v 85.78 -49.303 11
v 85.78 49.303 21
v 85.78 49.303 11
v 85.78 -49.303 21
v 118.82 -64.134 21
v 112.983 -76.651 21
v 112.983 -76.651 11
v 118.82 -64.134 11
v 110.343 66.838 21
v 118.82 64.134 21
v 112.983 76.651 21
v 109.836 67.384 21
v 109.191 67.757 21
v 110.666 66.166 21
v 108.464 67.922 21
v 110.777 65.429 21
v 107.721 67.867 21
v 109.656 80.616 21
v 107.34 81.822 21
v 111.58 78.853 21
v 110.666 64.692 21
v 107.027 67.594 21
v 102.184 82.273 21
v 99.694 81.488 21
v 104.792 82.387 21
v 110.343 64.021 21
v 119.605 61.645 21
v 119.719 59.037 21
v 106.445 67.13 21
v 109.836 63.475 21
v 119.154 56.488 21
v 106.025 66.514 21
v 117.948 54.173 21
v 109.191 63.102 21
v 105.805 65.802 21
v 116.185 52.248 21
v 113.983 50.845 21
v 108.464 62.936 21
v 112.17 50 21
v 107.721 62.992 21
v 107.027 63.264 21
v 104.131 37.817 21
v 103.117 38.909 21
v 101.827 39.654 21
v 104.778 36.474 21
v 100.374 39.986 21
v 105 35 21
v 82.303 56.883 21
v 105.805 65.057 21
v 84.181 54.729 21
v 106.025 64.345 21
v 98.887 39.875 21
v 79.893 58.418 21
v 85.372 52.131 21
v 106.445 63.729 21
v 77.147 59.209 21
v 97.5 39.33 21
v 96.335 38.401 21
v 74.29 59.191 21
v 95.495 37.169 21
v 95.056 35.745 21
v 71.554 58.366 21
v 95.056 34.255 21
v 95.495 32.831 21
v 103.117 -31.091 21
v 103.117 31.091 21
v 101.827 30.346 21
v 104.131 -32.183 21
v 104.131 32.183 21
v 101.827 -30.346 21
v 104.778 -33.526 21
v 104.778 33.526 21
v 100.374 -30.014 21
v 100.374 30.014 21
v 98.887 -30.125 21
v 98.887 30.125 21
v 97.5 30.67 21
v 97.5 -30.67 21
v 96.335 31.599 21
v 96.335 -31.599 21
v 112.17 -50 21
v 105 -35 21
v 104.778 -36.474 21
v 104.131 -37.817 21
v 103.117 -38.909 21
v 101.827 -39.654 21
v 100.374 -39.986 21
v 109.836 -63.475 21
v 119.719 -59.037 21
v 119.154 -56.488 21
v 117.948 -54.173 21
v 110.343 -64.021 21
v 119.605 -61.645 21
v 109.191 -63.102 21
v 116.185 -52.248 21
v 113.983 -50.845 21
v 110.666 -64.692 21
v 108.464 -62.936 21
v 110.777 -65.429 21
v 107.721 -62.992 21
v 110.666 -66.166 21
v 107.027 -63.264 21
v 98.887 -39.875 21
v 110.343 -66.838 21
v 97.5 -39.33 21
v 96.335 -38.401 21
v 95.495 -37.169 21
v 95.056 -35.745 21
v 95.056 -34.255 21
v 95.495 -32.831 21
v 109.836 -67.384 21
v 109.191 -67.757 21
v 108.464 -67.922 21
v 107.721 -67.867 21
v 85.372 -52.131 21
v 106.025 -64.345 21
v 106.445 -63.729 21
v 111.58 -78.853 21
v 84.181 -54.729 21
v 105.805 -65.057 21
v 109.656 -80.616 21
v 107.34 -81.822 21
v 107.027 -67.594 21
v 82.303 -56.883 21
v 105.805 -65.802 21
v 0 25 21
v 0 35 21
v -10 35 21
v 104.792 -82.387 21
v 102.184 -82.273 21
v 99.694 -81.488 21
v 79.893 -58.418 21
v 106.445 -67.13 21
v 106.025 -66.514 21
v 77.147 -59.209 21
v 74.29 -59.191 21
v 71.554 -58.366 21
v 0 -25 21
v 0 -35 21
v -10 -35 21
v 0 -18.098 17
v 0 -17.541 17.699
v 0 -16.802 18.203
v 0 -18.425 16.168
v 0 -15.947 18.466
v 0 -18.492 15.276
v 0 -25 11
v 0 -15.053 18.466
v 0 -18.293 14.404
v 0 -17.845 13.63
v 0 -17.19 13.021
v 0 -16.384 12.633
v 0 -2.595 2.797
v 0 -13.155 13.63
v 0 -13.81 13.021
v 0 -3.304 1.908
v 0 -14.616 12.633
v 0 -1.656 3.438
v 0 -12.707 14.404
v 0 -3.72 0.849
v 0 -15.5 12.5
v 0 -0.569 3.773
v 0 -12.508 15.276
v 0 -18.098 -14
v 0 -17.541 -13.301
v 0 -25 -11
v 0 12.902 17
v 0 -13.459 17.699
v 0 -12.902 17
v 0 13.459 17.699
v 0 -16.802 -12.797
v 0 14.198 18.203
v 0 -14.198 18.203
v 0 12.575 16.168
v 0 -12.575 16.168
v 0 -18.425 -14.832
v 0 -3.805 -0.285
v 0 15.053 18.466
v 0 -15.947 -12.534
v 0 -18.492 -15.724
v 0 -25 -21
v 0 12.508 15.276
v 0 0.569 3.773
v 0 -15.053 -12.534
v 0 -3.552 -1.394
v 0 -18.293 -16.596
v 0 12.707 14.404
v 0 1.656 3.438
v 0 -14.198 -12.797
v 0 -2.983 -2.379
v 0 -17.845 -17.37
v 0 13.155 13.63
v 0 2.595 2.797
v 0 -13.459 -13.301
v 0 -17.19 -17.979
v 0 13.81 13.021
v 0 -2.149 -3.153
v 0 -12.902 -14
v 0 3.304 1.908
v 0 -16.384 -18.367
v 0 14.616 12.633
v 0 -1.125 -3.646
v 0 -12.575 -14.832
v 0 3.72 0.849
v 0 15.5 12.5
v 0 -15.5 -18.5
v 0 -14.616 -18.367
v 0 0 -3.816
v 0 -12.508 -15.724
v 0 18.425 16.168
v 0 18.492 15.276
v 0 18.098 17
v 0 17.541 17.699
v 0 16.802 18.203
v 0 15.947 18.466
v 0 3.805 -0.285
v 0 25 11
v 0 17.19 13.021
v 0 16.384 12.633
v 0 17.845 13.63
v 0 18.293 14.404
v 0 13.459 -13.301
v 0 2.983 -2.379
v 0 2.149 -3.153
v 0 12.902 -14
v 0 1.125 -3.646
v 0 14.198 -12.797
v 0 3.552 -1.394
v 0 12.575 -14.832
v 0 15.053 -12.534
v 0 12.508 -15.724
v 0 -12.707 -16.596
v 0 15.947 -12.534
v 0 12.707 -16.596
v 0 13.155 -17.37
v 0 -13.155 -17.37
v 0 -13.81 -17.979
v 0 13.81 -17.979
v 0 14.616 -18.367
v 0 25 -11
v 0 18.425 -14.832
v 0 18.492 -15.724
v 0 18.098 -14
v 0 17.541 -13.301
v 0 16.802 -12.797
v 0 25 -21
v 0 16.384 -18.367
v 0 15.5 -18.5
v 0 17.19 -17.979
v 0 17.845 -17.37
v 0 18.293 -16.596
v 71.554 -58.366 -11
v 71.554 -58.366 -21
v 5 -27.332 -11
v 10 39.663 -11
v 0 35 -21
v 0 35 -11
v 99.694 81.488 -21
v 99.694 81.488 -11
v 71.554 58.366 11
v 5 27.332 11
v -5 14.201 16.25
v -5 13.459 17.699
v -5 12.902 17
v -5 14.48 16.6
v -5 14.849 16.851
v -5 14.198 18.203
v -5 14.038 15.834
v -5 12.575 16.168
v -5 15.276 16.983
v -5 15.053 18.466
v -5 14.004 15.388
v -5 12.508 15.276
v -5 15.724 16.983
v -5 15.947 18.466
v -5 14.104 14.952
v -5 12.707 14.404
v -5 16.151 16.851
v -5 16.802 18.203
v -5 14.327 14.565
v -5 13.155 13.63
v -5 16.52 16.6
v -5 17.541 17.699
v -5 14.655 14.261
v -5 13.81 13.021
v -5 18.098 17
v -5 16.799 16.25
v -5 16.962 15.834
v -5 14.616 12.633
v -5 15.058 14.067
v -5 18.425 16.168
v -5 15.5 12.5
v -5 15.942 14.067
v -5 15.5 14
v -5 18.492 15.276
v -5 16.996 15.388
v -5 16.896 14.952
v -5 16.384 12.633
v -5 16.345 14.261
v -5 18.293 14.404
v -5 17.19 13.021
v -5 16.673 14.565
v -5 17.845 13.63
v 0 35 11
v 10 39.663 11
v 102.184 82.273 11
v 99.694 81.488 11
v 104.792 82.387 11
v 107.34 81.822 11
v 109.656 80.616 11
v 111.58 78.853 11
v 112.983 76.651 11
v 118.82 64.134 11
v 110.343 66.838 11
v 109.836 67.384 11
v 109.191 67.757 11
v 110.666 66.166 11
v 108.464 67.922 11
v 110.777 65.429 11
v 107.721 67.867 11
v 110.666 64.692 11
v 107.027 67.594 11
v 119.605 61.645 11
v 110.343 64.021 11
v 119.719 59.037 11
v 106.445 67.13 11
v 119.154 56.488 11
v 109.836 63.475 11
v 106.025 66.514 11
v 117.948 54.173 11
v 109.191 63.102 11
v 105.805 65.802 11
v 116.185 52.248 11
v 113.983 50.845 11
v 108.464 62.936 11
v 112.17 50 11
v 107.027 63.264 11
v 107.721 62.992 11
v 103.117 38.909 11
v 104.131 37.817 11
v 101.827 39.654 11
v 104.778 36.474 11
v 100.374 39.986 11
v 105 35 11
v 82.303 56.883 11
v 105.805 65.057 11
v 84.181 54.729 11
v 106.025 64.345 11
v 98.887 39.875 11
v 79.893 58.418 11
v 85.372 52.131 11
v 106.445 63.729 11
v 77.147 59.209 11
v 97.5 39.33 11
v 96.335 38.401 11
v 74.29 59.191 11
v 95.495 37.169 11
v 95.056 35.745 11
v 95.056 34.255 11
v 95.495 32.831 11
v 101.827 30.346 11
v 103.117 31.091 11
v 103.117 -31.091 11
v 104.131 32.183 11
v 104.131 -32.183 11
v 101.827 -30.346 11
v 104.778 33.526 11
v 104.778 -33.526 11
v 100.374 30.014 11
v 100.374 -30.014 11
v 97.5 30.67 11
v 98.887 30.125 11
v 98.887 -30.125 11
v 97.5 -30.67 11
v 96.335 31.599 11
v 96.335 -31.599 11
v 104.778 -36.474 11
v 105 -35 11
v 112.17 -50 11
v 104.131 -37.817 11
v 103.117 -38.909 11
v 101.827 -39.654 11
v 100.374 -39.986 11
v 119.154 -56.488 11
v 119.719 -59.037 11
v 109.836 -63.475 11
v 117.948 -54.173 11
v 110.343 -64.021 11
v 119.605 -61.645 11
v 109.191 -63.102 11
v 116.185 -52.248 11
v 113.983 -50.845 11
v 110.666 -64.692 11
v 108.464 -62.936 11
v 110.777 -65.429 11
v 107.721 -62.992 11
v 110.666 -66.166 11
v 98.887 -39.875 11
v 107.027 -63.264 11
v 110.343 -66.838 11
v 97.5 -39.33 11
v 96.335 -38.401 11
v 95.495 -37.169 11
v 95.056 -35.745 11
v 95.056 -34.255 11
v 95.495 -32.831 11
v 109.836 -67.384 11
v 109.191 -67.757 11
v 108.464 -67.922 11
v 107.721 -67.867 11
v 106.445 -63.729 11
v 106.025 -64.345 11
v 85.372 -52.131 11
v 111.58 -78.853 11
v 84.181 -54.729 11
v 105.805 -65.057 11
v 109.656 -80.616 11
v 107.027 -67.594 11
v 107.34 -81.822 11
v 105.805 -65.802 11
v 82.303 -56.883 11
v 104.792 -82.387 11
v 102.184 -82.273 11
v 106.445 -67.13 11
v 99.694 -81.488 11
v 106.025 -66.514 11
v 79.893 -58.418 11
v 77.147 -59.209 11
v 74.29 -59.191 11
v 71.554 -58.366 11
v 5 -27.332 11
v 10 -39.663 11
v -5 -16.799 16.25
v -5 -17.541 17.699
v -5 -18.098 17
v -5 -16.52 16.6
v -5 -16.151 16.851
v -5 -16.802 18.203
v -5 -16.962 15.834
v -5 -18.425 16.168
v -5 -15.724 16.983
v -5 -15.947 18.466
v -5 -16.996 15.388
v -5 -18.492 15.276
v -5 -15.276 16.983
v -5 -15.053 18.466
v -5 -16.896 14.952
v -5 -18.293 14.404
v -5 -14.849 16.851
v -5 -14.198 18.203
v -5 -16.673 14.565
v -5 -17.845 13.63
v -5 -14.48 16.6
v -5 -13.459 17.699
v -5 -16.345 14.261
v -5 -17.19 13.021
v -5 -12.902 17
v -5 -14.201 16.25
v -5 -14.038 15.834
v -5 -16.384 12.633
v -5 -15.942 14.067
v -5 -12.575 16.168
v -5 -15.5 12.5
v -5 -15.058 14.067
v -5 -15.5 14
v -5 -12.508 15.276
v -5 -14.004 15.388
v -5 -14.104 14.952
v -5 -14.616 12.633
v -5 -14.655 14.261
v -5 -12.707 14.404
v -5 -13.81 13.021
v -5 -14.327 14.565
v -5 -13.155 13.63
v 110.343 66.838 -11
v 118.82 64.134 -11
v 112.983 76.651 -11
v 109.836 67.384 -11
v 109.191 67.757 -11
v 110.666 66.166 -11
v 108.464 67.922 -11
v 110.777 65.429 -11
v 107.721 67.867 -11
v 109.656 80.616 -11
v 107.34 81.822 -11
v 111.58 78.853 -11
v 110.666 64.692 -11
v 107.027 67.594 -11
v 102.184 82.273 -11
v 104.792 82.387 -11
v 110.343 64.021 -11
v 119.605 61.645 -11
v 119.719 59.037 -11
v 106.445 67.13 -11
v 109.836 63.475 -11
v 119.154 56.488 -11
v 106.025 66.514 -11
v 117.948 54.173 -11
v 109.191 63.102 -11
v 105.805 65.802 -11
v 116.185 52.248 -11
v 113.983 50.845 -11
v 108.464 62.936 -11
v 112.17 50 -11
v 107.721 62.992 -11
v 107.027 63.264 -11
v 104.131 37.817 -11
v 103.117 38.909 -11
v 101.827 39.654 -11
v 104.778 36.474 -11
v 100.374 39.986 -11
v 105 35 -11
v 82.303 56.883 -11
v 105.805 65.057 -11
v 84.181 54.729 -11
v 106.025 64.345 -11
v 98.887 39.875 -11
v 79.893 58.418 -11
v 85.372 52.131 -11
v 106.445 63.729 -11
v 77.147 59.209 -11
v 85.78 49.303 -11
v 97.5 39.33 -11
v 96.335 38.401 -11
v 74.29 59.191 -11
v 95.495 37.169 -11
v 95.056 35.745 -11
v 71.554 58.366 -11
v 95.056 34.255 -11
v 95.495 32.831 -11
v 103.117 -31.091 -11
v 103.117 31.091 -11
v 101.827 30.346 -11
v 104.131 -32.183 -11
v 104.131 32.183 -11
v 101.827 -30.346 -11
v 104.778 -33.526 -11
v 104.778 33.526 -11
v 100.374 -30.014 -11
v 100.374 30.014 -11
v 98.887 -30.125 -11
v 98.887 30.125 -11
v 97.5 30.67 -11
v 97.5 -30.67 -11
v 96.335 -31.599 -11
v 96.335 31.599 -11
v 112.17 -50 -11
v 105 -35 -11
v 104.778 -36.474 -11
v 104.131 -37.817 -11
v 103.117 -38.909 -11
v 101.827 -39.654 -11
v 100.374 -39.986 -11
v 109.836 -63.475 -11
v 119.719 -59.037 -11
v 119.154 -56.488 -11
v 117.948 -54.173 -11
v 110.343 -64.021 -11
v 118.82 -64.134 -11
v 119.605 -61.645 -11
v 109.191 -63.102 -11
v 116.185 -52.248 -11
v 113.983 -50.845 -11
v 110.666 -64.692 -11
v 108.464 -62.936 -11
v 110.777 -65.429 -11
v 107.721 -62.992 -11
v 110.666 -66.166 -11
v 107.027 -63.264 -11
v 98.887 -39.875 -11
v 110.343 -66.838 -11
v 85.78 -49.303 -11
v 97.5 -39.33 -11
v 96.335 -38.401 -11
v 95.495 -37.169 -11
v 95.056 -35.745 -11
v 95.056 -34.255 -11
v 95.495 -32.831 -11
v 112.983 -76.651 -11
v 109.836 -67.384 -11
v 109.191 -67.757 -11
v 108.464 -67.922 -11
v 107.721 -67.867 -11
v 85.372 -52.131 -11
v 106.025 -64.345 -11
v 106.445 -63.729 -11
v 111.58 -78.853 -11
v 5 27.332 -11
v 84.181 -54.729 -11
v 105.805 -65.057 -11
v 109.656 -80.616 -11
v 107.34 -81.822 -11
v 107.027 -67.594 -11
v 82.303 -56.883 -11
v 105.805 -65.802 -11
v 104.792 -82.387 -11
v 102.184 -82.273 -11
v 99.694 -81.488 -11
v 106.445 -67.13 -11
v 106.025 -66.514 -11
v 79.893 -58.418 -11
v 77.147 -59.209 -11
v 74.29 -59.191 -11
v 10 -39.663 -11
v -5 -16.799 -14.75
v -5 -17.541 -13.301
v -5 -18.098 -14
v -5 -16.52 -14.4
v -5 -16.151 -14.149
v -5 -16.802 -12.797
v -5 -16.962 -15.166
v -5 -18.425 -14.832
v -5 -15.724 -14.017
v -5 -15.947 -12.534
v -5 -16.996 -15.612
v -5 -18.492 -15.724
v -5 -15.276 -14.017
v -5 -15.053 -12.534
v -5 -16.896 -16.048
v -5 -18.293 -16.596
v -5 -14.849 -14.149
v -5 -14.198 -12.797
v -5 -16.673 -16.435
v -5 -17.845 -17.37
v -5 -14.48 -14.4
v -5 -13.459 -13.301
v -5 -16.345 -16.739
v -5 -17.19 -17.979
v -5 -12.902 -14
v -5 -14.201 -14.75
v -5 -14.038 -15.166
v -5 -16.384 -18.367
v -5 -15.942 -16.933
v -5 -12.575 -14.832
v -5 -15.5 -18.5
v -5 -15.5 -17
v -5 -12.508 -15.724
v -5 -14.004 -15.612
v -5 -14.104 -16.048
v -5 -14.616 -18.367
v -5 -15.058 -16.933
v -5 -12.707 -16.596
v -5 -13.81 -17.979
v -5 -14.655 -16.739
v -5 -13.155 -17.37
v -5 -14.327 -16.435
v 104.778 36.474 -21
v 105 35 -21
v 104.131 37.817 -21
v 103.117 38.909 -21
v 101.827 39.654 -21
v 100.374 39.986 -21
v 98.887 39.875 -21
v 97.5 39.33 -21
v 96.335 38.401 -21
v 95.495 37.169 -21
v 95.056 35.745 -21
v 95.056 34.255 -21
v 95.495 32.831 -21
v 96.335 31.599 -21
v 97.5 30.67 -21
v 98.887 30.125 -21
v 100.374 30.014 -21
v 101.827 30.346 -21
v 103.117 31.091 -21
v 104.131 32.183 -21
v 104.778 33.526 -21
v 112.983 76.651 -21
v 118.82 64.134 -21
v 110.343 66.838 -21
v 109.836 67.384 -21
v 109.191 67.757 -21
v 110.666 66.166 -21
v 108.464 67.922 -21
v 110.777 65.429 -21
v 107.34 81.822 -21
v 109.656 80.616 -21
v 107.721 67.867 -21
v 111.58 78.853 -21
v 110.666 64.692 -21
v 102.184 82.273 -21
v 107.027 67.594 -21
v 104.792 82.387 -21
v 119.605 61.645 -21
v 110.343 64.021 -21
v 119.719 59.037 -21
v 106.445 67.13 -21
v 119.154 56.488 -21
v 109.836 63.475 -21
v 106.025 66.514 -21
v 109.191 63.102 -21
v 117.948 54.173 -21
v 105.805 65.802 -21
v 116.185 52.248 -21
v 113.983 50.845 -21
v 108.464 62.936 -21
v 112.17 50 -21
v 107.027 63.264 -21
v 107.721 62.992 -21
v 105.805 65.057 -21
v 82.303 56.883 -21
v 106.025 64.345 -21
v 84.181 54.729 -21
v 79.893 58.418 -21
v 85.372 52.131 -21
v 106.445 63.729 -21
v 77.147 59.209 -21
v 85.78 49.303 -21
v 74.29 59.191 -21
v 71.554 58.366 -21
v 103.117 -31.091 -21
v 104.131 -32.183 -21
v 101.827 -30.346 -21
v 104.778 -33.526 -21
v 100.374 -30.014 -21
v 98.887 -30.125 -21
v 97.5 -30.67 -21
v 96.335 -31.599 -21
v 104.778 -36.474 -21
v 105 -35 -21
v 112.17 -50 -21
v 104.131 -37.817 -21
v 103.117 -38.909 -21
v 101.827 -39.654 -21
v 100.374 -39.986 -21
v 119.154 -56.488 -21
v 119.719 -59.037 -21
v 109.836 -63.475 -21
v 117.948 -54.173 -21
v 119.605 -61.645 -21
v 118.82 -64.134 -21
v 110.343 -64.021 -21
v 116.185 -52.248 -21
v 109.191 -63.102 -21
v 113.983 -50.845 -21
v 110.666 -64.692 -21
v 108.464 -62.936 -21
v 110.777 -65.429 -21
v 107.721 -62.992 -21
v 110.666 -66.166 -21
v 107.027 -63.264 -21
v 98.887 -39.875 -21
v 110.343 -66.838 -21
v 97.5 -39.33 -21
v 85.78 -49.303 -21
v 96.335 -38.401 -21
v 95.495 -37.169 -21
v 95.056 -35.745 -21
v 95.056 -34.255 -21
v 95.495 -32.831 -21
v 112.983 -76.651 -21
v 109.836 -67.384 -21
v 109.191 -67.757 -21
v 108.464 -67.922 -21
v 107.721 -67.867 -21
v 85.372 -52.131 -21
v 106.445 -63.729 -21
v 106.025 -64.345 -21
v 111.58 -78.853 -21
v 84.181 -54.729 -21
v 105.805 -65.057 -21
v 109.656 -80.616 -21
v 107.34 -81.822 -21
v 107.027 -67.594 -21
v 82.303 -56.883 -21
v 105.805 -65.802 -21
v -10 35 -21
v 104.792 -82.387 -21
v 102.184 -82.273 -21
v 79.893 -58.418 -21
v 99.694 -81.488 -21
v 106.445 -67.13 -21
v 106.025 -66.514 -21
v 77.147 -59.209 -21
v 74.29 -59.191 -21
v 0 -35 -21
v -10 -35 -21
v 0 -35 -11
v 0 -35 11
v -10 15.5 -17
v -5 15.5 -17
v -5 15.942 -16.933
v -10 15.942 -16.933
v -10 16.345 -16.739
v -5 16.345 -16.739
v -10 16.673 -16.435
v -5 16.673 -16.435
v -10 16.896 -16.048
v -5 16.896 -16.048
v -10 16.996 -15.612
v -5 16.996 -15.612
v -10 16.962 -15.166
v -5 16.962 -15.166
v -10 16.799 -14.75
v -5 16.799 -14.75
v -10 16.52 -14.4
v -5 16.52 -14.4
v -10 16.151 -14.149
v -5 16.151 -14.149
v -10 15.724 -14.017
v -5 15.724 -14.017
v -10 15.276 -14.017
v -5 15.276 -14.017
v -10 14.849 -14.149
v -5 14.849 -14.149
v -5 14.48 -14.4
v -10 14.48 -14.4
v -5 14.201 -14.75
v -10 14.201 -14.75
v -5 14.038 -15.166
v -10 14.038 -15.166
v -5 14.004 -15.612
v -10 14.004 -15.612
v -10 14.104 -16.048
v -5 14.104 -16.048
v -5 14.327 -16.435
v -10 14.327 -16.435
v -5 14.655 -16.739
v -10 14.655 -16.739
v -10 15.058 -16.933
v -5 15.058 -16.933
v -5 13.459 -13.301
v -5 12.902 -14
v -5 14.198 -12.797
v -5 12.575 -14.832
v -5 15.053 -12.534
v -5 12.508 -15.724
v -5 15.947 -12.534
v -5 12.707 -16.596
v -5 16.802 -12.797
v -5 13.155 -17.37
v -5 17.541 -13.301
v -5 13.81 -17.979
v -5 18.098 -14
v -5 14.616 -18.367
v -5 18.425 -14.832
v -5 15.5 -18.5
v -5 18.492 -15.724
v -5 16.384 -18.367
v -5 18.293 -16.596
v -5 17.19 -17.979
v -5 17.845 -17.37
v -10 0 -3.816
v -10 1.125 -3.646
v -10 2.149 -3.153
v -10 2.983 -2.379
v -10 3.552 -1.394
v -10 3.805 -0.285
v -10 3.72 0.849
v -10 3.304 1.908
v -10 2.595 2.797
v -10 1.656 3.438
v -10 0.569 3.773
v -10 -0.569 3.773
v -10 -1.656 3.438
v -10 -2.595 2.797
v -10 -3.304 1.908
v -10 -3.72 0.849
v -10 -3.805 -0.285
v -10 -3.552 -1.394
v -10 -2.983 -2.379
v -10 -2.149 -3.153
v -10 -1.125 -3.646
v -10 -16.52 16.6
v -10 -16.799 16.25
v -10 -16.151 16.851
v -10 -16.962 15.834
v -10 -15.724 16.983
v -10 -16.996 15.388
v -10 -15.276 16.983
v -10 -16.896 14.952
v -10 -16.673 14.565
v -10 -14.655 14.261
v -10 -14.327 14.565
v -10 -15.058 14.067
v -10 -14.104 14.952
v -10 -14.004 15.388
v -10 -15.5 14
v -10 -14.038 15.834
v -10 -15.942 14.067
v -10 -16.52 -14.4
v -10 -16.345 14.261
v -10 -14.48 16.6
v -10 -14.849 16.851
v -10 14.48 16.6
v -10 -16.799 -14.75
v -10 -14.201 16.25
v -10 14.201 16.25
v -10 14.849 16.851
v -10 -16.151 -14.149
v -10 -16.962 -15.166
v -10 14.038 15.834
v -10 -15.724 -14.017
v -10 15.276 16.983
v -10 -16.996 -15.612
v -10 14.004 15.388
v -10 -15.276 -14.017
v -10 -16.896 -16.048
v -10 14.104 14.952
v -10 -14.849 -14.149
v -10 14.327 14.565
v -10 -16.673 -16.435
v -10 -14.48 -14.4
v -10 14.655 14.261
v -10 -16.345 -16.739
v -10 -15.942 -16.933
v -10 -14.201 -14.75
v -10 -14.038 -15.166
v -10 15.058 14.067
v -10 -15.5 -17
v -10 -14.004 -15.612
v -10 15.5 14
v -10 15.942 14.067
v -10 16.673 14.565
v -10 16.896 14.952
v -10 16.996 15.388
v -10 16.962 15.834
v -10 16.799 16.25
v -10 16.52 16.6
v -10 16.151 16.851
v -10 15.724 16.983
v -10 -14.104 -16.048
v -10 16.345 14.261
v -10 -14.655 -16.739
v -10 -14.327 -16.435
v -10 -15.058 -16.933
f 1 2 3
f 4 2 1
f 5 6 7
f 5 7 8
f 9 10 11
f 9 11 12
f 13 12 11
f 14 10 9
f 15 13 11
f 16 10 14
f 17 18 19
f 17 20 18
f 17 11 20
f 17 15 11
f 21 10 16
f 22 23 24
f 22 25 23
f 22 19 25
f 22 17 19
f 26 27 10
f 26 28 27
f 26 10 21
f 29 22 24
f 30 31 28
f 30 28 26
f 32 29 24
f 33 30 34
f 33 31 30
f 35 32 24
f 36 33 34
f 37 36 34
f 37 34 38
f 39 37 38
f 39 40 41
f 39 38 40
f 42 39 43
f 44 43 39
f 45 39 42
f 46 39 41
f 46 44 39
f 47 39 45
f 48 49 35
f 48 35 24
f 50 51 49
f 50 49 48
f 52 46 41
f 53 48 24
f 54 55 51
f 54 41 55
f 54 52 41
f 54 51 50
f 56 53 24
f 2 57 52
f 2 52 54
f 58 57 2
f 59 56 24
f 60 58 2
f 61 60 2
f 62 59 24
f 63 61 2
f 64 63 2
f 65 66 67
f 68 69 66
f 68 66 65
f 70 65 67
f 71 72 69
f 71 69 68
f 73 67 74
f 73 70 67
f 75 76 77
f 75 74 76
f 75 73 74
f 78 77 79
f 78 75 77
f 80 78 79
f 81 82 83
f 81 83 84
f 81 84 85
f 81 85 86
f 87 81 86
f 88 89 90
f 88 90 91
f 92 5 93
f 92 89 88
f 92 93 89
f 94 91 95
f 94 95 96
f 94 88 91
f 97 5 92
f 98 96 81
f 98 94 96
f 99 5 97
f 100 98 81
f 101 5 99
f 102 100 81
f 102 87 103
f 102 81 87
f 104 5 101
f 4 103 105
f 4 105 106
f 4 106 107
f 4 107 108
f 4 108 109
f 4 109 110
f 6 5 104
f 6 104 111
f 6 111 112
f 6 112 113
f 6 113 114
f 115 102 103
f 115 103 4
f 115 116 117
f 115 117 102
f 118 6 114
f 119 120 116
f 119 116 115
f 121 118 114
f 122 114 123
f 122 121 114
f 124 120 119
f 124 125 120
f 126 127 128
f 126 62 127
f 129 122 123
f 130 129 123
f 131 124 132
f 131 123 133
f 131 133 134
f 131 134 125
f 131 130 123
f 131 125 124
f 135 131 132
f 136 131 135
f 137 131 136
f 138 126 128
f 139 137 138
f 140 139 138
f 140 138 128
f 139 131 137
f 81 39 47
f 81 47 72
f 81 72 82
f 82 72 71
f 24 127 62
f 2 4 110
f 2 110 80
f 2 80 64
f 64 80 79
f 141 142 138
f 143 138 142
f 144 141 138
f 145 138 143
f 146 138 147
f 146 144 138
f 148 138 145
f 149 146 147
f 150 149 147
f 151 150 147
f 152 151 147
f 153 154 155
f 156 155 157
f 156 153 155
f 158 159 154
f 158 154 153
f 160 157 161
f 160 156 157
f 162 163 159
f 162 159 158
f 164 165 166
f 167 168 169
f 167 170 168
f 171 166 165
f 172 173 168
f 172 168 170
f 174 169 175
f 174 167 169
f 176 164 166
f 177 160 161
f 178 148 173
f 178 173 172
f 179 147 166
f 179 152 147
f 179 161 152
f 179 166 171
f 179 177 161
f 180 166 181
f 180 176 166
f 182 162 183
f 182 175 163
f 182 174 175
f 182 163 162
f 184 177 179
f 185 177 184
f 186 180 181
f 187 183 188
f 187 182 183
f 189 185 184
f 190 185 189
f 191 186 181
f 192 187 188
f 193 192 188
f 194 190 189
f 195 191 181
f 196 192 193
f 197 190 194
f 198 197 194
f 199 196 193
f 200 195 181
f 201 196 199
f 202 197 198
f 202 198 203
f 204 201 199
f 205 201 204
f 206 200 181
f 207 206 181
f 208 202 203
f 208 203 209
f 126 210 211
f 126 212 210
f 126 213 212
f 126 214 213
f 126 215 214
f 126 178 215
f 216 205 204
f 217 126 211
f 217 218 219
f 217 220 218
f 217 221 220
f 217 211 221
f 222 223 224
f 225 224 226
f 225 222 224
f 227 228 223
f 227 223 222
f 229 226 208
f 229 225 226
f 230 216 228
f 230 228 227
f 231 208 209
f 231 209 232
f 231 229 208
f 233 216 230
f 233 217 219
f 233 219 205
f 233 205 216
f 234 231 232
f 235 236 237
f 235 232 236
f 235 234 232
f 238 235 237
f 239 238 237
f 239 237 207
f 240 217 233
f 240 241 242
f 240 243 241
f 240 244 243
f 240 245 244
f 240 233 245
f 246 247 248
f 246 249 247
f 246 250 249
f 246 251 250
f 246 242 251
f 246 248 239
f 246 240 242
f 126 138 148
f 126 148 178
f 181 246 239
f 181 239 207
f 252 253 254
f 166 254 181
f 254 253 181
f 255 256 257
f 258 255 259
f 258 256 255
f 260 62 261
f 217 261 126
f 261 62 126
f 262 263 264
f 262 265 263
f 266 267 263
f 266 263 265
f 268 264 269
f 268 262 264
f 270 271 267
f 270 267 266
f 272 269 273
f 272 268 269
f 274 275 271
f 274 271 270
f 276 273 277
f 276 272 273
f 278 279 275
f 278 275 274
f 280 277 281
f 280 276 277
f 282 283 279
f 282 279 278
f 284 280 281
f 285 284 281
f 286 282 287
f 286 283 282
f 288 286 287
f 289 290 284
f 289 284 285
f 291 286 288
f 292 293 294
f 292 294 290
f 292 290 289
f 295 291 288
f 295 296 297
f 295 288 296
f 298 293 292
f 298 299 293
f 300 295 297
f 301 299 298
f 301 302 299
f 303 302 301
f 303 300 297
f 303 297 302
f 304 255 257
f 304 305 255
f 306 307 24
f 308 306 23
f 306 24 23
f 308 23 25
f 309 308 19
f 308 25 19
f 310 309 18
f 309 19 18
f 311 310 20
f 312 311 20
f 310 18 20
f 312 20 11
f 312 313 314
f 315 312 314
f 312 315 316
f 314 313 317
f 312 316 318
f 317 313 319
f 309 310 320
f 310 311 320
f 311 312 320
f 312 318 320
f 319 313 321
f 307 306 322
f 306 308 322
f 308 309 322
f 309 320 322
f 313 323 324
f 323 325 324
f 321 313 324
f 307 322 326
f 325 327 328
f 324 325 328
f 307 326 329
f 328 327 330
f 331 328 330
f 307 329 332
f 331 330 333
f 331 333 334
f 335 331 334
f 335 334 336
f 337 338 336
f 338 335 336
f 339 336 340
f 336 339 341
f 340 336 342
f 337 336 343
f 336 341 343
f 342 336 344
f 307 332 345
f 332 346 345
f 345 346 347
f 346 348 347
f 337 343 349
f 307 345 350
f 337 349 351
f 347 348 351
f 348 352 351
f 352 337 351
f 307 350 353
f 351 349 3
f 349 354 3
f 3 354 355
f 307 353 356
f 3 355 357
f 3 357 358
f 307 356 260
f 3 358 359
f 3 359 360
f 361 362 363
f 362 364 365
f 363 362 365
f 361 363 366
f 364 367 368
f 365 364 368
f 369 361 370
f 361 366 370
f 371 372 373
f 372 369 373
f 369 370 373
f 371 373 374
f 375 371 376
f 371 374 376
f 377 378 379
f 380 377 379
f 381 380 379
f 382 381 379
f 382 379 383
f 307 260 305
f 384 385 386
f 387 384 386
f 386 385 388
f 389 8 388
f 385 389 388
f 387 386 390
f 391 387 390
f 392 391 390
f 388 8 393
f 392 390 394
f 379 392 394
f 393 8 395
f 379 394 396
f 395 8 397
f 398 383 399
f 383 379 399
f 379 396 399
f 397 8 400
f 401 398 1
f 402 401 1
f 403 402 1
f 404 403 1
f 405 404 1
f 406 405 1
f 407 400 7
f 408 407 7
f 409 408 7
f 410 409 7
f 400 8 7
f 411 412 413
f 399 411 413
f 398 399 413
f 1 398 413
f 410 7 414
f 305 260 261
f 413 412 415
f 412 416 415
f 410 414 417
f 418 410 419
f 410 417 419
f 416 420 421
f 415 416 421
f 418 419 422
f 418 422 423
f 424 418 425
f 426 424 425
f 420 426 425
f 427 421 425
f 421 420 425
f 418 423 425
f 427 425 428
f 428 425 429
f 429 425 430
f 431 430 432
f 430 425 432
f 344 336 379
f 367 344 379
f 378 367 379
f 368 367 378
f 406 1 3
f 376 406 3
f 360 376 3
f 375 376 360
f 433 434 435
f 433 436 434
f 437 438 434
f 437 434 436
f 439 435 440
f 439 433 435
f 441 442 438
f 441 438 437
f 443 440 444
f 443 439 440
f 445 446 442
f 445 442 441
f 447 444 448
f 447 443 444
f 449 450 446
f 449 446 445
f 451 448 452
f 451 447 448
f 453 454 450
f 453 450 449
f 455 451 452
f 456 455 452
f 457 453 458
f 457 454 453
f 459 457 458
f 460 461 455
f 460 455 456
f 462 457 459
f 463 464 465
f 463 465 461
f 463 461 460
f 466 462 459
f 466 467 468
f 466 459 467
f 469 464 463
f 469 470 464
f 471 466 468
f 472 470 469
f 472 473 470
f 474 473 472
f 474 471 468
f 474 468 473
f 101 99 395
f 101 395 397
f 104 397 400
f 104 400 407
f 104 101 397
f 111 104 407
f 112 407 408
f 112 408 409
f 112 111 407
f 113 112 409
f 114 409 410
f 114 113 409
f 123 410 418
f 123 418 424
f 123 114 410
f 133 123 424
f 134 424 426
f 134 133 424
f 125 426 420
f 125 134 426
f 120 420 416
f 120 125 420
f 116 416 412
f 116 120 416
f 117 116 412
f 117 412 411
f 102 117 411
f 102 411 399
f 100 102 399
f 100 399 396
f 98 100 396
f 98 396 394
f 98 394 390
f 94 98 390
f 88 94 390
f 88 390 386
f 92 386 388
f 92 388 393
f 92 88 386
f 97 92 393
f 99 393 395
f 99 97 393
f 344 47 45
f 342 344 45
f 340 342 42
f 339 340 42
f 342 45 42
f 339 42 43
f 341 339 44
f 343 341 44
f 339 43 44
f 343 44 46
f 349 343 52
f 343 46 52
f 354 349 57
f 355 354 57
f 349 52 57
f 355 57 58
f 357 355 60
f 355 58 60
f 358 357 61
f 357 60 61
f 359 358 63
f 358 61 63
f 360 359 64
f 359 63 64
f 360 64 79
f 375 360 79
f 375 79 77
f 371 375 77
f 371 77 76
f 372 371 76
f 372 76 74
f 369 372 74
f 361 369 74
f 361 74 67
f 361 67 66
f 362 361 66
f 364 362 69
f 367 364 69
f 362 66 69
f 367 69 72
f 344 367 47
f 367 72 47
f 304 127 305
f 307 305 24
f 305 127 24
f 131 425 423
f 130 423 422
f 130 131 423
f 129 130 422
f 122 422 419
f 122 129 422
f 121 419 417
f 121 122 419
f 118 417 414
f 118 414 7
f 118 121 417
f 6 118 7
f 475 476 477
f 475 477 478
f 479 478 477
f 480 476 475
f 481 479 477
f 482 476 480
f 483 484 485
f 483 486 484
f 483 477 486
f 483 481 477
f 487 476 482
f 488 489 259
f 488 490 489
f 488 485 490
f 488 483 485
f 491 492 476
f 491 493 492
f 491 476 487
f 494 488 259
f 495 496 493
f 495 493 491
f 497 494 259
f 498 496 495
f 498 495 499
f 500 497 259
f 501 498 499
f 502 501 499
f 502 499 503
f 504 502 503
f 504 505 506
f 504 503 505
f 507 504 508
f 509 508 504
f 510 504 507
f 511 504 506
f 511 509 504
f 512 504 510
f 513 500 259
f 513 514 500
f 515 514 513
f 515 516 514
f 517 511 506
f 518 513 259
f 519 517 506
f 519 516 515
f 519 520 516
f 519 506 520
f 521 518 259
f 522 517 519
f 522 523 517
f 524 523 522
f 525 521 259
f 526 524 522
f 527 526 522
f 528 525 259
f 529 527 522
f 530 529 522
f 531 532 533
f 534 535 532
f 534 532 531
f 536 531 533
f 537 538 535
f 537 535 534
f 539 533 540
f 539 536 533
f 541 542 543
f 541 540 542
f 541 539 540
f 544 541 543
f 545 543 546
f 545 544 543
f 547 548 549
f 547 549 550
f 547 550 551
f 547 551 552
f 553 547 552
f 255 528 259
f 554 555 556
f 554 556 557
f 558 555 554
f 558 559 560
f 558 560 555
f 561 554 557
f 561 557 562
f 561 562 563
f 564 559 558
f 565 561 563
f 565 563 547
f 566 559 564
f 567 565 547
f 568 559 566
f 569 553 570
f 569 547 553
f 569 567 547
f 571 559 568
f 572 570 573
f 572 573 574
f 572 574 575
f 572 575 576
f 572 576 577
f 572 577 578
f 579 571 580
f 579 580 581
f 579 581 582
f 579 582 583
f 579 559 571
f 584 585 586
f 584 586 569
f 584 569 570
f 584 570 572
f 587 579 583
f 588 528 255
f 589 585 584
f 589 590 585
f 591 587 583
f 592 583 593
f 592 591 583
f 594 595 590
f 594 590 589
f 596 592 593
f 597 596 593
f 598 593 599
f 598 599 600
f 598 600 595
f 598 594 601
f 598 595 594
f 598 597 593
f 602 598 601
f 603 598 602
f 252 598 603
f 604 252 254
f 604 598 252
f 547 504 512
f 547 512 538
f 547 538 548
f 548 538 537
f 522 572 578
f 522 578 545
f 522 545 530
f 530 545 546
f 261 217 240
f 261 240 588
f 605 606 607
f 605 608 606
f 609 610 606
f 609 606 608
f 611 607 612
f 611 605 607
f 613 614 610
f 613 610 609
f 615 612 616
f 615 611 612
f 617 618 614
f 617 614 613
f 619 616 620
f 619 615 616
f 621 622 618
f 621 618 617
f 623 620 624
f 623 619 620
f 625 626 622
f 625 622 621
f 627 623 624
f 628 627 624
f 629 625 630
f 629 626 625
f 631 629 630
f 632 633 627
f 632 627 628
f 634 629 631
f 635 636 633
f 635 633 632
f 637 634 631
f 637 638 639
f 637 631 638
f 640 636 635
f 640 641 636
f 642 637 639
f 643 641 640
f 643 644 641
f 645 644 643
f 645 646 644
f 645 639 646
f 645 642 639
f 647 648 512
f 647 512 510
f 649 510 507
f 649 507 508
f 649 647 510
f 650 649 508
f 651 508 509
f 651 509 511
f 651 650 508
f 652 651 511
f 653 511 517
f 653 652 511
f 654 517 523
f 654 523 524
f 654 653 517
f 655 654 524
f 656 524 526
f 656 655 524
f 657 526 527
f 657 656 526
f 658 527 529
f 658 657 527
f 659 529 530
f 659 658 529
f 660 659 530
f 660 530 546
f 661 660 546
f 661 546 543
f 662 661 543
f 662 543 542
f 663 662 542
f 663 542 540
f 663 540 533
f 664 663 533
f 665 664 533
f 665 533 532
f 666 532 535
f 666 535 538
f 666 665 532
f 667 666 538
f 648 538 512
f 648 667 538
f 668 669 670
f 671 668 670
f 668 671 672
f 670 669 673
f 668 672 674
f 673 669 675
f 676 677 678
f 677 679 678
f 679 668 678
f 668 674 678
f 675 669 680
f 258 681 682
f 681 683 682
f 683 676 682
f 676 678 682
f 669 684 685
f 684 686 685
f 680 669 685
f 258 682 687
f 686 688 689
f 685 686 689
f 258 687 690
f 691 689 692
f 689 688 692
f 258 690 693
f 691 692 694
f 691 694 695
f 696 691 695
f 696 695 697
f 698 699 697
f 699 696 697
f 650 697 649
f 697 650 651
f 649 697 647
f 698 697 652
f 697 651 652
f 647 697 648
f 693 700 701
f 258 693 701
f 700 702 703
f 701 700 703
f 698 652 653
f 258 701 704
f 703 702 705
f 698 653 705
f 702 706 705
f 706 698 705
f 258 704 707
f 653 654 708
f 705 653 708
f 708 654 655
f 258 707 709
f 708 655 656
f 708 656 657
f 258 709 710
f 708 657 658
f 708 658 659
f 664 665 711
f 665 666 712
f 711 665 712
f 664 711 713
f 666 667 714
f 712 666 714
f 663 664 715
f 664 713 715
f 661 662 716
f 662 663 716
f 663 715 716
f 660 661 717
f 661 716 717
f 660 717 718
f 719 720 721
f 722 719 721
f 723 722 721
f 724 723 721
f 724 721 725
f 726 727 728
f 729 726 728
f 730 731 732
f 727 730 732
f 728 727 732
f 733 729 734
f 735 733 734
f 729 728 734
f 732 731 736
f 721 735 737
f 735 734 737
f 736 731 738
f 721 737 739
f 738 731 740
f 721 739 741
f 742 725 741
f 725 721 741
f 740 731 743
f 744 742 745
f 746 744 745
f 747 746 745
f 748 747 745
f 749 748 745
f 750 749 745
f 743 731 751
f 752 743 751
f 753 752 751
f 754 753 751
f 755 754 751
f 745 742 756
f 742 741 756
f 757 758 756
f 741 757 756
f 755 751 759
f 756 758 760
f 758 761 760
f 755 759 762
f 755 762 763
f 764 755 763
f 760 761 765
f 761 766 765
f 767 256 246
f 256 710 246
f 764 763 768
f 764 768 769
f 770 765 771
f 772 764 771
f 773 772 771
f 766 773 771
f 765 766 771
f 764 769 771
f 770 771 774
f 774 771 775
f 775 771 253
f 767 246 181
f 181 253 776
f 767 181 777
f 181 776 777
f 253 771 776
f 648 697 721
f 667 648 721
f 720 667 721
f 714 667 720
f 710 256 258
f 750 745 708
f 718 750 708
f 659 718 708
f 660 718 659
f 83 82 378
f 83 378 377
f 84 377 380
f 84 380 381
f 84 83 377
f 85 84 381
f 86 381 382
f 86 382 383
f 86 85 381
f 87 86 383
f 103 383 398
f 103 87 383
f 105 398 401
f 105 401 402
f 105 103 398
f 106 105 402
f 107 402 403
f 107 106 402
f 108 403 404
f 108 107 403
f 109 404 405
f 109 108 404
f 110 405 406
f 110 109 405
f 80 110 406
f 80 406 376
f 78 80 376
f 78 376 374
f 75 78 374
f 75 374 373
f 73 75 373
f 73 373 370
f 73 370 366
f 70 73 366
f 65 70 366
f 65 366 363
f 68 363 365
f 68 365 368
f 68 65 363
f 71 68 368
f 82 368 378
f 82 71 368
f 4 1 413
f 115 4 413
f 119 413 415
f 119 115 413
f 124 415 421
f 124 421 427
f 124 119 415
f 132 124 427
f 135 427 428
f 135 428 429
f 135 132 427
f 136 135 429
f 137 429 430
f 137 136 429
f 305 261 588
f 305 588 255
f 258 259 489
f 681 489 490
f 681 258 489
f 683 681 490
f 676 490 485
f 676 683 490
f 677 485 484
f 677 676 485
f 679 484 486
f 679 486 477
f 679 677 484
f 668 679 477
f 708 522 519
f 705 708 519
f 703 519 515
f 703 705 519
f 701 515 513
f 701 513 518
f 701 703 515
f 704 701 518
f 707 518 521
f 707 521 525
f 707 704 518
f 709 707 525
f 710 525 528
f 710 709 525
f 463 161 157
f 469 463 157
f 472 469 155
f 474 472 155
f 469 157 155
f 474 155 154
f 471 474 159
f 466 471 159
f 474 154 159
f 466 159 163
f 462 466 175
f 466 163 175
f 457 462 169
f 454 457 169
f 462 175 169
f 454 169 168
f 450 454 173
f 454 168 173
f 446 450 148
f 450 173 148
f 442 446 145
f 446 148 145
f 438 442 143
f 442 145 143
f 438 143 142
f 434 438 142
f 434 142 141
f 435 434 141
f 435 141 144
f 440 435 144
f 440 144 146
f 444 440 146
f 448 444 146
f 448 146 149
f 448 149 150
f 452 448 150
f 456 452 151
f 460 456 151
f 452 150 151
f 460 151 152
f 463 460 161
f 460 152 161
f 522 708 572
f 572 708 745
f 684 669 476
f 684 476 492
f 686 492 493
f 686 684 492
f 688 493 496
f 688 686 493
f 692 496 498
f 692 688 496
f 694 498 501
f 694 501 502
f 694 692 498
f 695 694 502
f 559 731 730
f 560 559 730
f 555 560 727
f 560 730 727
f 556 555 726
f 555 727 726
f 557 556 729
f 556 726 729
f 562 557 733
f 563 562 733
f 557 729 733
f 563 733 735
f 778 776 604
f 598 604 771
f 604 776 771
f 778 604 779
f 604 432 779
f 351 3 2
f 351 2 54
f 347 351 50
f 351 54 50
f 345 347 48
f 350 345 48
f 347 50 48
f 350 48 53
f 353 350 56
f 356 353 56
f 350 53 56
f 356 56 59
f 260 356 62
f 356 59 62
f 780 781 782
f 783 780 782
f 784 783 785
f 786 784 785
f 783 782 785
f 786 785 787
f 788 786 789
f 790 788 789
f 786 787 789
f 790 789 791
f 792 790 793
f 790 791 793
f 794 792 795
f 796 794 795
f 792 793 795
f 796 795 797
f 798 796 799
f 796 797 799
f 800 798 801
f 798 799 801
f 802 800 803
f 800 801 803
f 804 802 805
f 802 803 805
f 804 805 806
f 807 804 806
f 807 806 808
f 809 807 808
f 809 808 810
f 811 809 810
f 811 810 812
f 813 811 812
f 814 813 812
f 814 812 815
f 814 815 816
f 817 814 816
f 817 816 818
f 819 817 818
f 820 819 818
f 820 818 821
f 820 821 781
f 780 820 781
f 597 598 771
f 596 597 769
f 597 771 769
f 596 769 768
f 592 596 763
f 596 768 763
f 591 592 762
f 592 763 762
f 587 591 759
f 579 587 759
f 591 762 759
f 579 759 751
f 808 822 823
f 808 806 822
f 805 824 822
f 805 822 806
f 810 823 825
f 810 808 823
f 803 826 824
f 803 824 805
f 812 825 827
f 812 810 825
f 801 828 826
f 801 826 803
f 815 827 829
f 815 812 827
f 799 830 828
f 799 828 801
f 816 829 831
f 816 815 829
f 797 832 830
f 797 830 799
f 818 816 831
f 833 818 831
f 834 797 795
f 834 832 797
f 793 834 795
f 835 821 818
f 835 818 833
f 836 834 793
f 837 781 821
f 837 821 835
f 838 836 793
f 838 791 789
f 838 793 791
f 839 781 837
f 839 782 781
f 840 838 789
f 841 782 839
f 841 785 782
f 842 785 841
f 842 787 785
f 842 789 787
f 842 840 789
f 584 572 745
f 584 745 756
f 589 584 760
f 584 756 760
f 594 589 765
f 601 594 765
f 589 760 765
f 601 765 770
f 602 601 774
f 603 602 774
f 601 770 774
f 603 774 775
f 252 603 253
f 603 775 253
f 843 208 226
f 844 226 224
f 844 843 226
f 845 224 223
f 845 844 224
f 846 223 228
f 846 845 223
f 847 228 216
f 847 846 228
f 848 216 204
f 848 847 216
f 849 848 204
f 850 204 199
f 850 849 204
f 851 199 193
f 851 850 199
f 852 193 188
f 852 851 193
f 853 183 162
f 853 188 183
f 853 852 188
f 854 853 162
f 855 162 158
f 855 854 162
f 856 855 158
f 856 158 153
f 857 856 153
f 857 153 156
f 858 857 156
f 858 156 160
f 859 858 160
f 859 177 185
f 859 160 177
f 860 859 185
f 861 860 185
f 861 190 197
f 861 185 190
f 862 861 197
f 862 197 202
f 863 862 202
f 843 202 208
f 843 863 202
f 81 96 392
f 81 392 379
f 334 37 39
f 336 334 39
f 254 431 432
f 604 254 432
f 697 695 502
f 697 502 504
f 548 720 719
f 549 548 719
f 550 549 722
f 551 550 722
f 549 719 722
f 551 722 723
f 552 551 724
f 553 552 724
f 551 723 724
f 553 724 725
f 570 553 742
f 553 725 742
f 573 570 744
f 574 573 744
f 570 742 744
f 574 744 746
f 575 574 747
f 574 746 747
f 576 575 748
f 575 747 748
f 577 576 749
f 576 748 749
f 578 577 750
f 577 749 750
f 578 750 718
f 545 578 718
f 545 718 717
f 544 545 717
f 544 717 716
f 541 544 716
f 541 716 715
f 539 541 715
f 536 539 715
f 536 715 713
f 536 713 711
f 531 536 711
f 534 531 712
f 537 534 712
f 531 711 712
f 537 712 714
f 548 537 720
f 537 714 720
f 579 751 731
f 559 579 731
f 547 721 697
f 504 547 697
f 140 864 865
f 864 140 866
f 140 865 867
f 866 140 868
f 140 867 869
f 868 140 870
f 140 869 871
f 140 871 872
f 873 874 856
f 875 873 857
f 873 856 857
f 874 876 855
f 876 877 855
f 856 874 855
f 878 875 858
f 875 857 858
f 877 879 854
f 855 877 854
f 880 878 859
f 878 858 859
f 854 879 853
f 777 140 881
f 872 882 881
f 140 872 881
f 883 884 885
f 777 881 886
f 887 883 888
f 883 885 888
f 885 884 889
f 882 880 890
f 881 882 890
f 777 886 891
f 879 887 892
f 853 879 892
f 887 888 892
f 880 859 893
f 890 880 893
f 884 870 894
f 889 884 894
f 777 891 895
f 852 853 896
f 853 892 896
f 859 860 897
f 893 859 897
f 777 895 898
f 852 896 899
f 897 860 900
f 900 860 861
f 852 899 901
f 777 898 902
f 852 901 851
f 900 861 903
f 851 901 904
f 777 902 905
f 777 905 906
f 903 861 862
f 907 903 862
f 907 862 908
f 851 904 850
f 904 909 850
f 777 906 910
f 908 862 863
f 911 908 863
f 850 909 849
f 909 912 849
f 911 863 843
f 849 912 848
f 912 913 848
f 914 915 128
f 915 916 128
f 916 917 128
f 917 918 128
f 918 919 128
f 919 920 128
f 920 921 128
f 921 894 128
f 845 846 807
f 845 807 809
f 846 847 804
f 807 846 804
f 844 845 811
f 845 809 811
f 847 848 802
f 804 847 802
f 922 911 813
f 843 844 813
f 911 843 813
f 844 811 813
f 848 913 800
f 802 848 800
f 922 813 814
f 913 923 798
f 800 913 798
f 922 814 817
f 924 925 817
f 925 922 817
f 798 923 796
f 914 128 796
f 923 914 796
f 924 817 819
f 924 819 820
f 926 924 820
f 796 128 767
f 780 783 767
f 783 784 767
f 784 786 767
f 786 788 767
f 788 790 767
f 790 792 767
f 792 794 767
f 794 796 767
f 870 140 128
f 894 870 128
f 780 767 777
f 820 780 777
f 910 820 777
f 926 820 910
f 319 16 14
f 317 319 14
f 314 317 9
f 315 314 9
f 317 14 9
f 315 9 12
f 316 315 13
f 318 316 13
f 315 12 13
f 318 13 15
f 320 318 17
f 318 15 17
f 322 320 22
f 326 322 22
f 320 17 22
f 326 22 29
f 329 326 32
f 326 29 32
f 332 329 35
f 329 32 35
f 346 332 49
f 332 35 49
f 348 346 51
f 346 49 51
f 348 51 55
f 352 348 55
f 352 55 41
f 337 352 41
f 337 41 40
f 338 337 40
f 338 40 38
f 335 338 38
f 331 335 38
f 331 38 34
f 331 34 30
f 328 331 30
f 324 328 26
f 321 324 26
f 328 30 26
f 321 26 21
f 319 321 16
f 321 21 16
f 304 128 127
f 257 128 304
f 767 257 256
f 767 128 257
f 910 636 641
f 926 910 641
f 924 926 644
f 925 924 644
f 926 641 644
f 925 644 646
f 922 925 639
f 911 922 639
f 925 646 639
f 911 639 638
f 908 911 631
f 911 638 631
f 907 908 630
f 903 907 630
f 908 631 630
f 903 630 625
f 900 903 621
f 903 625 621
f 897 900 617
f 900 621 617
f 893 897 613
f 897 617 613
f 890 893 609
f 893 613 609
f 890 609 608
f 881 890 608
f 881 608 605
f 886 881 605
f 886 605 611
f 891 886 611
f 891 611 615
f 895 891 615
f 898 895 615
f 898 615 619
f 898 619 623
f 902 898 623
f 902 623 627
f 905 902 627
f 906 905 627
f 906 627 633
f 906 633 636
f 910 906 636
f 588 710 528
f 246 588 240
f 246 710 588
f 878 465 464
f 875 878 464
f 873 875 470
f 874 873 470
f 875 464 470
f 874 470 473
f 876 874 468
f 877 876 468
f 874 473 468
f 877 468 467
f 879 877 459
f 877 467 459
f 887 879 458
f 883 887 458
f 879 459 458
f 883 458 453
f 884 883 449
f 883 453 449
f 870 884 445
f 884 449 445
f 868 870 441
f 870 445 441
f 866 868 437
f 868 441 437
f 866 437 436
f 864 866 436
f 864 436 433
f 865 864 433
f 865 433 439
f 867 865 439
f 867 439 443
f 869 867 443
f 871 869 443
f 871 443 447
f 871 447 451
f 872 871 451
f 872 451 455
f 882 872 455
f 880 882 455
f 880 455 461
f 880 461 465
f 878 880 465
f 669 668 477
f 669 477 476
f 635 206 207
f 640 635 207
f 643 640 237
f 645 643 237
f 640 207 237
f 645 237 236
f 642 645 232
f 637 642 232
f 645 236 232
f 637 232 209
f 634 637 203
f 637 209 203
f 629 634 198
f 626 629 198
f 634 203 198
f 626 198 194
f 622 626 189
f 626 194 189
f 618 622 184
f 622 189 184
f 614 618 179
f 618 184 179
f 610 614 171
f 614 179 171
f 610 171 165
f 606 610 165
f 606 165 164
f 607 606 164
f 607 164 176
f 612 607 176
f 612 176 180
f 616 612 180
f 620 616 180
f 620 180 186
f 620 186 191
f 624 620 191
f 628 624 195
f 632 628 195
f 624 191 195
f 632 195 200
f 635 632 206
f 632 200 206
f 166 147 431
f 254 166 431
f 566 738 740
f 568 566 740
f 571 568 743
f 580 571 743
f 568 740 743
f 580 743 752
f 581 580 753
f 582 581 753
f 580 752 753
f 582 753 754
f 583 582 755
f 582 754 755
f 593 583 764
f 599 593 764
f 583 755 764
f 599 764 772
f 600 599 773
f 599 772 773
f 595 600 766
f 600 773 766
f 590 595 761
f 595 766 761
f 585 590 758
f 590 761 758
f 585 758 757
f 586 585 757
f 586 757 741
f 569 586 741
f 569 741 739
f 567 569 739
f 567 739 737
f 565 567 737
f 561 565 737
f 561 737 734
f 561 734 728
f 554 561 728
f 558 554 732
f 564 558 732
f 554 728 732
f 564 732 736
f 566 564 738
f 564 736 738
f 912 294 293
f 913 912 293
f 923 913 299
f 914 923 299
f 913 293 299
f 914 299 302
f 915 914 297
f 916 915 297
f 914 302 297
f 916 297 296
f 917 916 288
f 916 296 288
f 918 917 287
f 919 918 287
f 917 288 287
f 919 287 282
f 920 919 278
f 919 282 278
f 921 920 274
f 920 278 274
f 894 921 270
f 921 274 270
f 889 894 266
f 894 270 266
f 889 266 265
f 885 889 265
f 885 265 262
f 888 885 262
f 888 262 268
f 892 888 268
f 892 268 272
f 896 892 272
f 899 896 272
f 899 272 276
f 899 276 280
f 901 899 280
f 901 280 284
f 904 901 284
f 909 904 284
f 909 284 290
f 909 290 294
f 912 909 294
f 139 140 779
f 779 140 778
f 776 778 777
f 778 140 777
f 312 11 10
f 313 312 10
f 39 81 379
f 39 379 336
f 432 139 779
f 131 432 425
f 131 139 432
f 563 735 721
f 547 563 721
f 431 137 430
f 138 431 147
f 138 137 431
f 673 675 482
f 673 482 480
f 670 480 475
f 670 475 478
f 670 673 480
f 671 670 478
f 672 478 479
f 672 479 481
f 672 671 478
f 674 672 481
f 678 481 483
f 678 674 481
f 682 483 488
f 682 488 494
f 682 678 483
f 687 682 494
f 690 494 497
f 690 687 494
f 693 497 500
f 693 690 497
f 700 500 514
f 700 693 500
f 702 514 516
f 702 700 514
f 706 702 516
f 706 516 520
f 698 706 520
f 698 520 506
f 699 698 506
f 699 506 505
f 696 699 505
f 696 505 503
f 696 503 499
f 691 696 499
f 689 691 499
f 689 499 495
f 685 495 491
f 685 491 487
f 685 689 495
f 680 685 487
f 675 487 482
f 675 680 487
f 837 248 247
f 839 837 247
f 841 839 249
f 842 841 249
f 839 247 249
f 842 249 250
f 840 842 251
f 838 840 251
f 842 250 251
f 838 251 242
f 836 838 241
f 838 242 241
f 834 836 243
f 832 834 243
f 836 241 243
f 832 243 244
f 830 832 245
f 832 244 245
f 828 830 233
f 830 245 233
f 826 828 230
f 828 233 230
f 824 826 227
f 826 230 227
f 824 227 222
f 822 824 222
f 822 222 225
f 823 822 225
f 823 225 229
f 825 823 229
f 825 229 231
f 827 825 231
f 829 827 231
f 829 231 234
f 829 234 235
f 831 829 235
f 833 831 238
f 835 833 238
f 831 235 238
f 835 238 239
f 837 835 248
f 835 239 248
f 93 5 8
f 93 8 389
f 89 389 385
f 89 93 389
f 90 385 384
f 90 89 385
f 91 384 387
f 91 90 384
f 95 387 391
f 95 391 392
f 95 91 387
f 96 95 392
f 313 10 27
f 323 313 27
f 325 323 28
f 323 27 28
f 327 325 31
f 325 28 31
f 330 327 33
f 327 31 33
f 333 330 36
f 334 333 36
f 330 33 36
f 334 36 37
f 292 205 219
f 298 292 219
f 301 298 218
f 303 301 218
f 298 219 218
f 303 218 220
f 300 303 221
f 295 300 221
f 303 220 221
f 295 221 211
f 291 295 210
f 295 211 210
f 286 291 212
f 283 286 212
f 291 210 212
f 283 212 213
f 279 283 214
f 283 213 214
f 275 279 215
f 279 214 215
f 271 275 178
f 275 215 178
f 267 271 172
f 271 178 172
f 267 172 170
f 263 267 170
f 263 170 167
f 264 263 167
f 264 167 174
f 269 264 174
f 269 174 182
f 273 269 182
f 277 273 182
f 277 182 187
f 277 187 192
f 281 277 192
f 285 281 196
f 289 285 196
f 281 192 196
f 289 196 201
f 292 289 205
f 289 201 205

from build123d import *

# Parameters (mm, degrees)
SKETCH_1_W                  = 42
SKETCH_1_H                  = 70
SKETCH_1_R                  = 3.815643184
EXTRUDE_1_DEPTH             = 10
SKETCH_2_R                  = 5
SKETCH_2_R_2                = 2.5
EXTRUDE_2_DEPTH             = 10
MIRROR_23_COPY_1_SKETCH_R   = 5
MIRROR_23_COPY_1_SKETCH_R_2 = 2.5
MIRROR_23_COPY_1_DEPTH      = 10
SKETCH_3_R                  = 3
CUT_EXTRUDE_1_DEPTH         = 5
SKETCH_4_R                  = 1.5
CUT_EXTRUDE_2_DEPTH         = 151.99366476
EXTRUDE_3_DEPTH             = 11


with BuildPart() as part:
    # 草图1 → 凸台-拉伸1 (new body)
    with BuildSketch(Plane(origin=(-10, 0, 0), x_dir=(0, 0, -1), z_dir=(1, 0, 0))):
        Rectangle(SKETCH_1_W, SKETCH_1_H)
        Circle(SKETCH_1_R, mode=Mode.SUBTRACT)
    extrude_1 = extrude(amount=EXTRUDE_1_DEPTH)


with BuildPart() as body_2:
    # 草图2 → 凸台-拉伸2 (new body)
    with BuildSketch(Plane.XY.offset(21)):
        with BuildLine():
            Line((0, 35), (99.693856574, 81.488008791))
            ThreePointArc((99.693856574, 81.488008791), (107.340240625, 81.821857129), (112.983117062, 76.651113539))
            Line((112.983117062, 76.651113539), (118.819711203, 64.134497011))
            ThreePointArc((118.819711203, 64.134497011), (119.15355954, 56.488112961), (113.98281595, 50.845236523))
            Line((113.98281595, 50.845236523), (112.170200376, 50))
            Line((112.170200376, 50), (112.170200376, 0))
            Line((112.170200376, 0), (85.78027682, 0))
            Line((85.78027682, 0), (85.78027682, 49.303144229))
            ThreePointArc((85.78027682, 49.303144229), (81.153272904, 57.737058687), (71.554094203, 58.366222099))
            Line((71.554094203, 58.366222099), (0, 25))
            Line((0, 25), (0, 35))
        make_face()
        with Locations((100, 35)):
            Circle(SKETCH_2_R, mode=Mode.SUBTRACT)
        with Locations((108.27716468, 65.429340608)):
            Circle(SKETCH_2_R_2, mode=Mode.SUBTRACT)
    extrude_2 = extrude(amount=-EXTRUDE_2_DEPTH)


with BuildPart() as part_1:
    add(part.part)

    add(body_2.part)  # 镜向5 merges body 2
    # 镜向5: 凸台-拉伸2 across plane
    add(extrude_2.mirror(Plane.ZX))

    # 镜向23: 凸台-拉伸1, 凸台-拉伸2 across plane
    add(extrude_1.mirror(Plane.XY))
    add(extrude_2.mirror(Plane.XY))

    # 镜向23 copy 1 sketch → 镜向23 copy 1 (add)
    with BuildSketch(Plane(origin=(0, 0, -21), x_dir=(1, 0, 0), z_dir=(0, 0, -1))):
        with BuildLine():
            Line((0, 35), (99.693856574, 81.488008791))
            ThreePointArc((99.693856574, 81.488008791), (107.340240625, 81.821857129), (112.983117062, 76.651113539))
            Line((112.983117062, 76.651113539), (118.819711203, 64.134497011))
            ThreePointArc((118.819711203, 64.134497011), (119.15355954, 56.488112961), (113.98281595, 50.845236523))
            Line((113.98281595, 50.845236523), (112.170200376, 50))
            Line((112.170200376, 50), (112.170200376, 0))
            Line((112.170200376, 0), (85.78027682, 0))
            Line((85.78027682, 0), (85.78027682, 49.303144229))
            ThreePointArc((85.78027682, 49.303144229), (81.153272904, 57.737058687), (71.554094203, 58.366222099))
            Line((71.554094203, 58.366222099), (0, 25))
            Line((0, 25), (0, 35))
        make_face()
        with Locations((100, 35)):
            Circle(MIRROR_23_COPY_1_SKETCH_R, mode=Mode.SUBTRACT)
        with Locations((108.27716468, 65.429340608)):
            Circle(MIRROR_23_COPY_1_SKETCH_R_2, mode=Mode.SUBTRACT)
    extrude(amount=-MIRROR_23_COPY_1_DEPTH)

    # 草图3 → 切除-拉伸1 (cut)
    with BuildSketch(Plane(origin=(0, 0, 0), x_dir=(0, 0, -1), z_dir=(1, 0, 0))):
        with Locations((15.5, 15.5)):
            Circle(SKETCH_3_R)
        with Locations((15.5, -15.5)):
            Circle(SKETCH_3_R)
        with Locations((-15.5, -15.5)):
            Circle(SKETCH_3_R)
        with Locations((-15.5, 15.5)):
            Circle(SKETCH_3_R)
    extrude(amount=-CUT_EXTRUDE_1_DEPTH, mode=Mode.SUBTRACT)

    # 草图4 → 切除-拉伸2 (cut, through all)
    with BuildSketch(Plane(origin=(-5, 0, 0), x_dir=(0, 0, -1), z_dir=(1, 0, 0))):
        with Locations((15.5, 15.5)):
            Circle(SKETCH_4_R)
        with Locations((-15.5, 15.5)):
            Circle(SKETCH_4_R)
        with Locations((-15.5, -15.5)):
            Circle(SKETCH_4_R)
        with Locations((15.5, -15.5)):
            Circle(SKETCH_4_R)
    extrude(amount=-CUT_EXTRUDE_2_DEPTH, mode=Mode.SUBTRACT)

    # 草图5 → 凸台-拉伸3 (add, symmetric)
    with BuildSketch(Plane.XY):
        Polygon((0, 35), (0, 25), (5, 27.331538291), (10, 39.663076582), align=None)
    extrude_3 = extrude(amount=EXTRUDE_3_DEPTH, both=True)

    # 镜向24: 凸台-拉伸3 across plane
    add(extrude_3.mirror(Plane.ZX))


solid = part_1.part
